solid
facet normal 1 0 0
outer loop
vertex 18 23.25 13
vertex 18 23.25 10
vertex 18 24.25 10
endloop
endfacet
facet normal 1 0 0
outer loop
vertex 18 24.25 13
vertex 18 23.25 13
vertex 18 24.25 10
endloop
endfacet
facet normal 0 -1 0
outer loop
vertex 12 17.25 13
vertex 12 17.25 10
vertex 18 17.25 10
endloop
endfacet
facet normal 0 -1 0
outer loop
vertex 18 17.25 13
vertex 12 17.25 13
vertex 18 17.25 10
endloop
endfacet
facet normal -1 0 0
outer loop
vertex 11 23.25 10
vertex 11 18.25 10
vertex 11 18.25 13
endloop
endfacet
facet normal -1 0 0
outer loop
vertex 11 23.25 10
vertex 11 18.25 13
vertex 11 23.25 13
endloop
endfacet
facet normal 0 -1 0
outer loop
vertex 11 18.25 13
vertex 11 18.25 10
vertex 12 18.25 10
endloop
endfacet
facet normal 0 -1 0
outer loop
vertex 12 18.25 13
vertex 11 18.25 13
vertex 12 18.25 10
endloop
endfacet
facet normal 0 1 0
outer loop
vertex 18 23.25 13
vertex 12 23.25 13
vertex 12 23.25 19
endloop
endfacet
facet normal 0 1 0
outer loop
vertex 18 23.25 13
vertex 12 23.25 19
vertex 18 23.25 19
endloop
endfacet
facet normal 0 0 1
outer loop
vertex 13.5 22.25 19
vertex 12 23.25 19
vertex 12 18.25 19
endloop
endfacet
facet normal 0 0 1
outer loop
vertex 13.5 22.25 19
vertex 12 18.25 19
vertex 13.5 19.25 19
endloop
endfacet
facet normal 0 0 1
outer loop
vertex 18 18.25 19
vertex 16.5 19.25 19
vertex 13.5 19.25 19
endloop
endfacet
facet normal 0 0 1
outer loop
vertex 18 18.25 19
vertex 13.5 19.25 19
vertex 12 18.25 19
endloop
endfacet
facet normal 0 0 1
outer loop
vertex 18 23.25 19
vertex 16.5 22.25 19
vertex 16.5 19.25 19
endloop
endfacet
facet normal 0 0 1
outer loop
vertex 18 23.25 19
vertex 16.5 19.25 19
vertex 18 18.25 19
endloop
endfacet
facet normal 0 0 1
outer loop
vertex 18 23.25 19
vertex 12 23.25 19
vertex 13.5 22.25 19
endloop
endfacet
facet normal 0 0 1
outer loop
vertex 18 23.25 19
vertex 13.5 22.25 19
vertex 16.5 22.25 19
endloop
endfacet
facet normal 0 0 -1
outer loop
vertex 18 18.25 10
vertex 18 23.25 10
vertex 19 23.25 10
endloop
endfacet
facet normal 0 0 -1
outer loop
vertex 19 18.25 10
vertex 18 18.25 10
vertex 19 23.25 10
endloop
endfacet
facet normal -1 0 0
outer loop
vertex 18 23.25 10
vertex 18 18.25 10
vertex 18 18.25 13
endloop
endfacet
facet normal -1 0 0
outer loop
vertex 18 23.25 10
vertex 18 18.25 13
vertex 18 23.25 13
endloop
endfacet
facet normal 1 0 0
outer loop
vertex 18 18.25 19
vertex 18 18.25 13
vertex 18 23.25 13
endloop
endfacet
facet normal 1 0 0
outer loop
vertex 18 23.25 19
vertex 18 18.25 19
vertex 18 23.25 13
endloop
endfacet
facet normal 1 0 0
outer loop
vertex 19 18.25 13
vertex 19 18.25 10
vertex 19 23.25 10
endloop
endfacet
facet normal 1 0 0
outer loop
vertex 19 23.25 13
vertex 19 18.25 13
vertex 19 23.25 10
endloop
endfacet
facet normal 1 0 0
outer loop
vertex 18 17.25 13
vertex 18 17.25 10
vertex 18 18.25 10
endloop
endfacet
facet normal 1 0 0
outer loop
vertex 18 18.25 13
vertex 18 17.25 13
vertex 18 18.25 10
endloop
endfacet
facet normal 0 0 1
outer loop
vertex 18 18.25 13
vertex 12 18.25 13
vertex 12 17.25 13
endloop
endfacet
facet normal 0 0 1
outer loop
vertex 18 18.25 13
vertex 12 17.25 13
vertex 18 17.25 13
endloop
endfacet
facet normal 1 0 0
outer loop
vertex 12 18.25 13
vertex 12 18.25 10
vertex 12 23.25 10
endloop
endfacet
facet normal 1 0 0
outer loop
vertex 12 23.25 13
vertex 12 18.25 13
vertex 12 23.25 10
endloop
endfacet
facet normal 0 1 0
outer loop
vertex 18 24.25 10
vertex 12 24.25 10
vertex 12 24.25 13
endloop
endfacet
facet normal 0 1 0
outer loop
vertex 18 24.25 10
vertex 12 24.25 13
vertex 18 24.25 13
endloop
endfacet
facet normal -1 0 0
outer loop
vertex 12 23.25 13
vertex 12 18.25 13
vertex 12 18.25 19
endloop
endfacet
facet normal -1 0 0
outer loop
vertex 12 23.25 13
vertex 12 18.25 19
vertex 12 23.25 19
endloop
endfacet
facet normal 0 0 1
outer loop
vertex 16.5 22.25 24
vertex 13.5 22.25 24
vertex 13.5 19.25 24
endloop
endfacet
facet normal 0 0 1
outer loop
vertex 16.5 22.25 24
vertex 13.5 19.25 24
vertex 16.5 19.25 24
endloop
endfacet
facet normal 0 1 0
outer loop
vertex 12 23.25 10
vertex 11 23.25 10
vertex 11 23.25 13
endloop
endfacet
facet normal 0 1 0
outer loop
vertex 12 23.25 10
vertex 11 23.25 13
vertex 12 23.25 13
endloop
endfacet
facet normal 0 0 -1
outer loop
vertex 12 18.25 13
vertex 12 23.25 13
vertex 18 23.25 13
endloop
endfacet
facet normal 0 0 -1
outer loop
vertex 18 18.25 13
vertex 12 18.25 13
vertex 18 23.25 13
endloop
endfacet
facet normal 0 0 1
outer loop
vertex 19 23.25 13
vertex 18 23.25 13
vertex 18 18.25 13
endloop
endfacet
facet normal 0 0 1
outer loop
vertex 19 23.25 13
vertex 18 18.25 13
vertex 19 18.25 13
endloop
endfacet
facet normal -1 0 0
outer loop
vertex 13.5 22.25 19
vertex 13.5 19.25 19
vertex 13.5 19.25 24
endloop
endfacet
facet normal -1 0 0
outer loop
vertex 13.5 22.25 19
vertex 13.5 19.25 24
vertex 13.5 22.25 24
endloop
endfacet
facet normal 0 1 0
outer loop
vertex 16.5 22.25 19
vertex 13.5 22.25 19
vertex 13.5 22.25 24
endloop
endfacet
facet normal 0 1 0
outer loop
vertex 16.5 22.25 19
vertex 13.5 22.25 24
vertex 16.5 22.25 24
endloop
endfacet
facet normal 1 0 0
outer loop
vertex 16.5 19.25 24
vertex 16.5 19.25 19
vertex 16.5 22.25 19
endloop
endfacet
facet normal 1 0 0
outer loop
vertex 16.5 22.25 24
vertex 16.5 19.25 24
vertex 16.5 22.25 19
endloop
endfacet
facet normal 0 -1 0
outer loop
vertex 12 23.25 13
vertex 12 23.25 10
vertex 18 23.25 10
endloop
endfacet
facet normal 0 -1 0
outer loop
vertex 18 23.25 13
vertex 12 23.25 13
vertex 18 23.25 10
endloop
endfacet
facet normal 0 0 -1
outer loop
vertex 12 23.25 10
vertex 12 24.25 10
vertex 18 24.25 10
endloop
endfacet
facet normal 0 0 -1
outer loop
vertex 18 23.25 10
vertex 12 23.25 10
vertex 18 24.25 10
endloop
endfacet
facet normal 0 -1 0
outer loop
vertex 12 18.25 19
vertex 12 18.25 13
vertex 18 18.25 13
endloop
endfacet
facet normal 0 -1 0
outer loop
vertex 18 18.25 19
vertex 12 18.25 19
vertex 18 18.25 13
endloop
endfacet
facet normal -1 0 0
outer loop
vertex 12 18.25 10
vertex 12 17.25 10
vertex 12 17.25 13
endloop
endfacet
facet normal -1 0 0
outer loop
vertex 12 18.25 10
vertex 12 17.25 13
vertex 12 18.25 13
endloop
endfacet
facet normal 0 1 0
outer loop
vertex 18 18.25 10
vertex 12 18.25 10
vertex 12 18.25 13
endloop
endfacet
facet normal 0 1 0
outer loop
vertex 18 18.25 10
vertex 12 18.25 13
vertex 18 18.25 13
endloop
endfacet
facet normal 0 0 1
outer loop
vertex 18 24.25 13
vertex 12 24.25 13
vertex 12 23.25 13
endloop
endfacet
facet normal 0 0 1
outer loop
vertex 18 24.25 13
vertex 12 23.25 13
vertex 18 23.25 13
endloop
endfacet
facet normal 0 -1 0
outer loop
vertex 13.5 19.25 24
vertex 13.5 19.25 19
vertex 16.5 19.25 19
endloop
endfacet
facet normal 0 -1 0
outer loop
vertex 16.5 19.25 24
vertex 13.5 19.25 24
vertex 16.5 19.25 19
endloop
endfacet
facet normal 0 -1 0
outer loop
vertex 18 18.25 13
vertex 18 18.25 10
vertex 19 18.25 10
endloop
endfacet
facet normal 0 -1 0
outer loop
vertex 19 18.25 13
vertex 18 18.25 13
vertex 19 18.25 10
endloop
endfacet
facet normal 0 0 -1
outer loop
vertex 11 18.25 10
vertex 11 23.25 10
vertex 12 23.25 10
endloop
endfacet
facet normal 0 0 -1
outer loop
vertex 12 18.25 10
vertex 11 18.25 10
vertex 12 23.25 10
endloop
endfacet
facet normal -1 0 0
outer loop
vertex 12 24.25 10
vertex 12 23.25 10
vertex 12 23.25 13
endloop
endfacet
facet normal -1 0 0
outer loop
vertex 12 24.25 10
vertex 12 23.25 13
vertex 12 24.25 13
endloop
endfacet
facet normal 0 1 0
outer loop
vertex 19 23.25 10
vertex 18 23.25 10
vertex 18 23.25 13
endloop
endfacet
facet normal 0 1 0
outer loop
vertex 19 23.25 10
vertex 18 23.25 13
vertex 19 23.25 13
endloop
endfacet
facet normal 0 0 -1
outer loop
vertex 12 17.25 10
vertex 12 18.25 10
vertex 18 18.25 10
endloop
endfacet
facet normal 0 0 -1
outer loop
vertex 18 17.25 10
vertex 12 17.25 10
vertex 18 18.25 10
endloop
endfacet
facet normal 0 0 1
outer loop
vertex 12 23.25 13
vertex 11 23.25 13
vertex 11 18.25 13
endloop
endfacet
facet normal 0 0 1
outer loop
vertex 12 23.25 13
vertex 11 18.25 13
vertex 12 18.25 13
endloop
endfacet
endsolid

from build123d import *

# Parameters (mm, degrees)
BOX036_W     = 3
BOX036_H     = 3
BOX036_DEPTH = 10
BOX038_W     = 1
BOX038_H     = 5
BOX038_DEPTH = 3
BOX039_W     = 1
BOX039_H     = 5
BOX039_DEPTH = 3
BOX040_W     = 6
BOX040_H     = 1
BOX040_DEPTH = 3
BOX041_W     = 6
BOX041_H     = 1
BOX041_DEPTH = 3
BOX037_W     = 6
BOX037_H     = 5
BOX037_DEPTH = 6


with BuildPart() as box036:
    # Box036 → Box036 (new body)
    with BuildSketch(Plane(origin=(13.5, 8.25, 10), x_dir=(1, 0, 0), z_dir=(0, 0, 1))):
        with Locations((1.5, 1.5)):
            Rectangle(BOX036_W, BOX036_H)
    extrude(amount=BOX036_DEPTH)


with BuildPart() as box038:
    # Box038 → Box038 (new body)
    with BuildSketch(Plane(origin=(11, 7.25, 6), x_dir=(1, 0, 0), z_dir=(0, 0, 1))):
        with Locations((0.5, 2.5)):
            Rectangle(BOX038_W, BOX038_H)
    extrude(amount=BOX038_DEPTH)


with BuildPart() as box039:
    # Box039 → Box039 (new body)
    with BuildSketch(Plane(origin=(18, 7.25, 6), x_dir=(1, 0, 0), z_dir=(0, 0, 1))):
        with Locations((0.5, 2.5)):
            Rectangle(BOX039_W, BOX039_H)
    extrude(amount=BOX039_DEPTH)


with BuildPart() as box040:
    # Box040 → Box040 (new body)
    with BuildSketch(Plane(origin=(12, 6.25, 6), x_dir=(1, 0, 0), z_dir=(0, 0, 1))):
        with Locations((3, 0.5)):
            Rectangle(BOX040_W, BOX040_H)
    extrude(amount=BOX040_DEPTH)


with BuildPart() as box041:
    # Box041 → Box041 (new body)
    with BuildSketch(Plane(origin=(12, 12.25, 6), x_dir=(1, 0, 0), z_dir=(0, 0, 1))):
        with Locations((3, 0.5)):
            Rectangle(BOX041_W, BOX041_H)
    extrude(amount=BOX041_DEPTH)


with BuildPart() as bt_ex2:
    # Box037 → Box037 (new body)
    with BuildSketch(Plane(origin=(12, 7.25, 9), x_dir=(1, 0, 0), z_dir=(0, 0, 1))):
        with Locations((3, 2.5)):
            Rectangle(BOX037_W, BOX037_H)
    extrude(amount=BOX037_DEPTH)

    # Fusion010: union Box038, Box039, Box040, Box041
    add(box038.part)
    add(box039.part)
    add(box040.part)
    add(box041.part)

    # Fusion011: union Box036
    add(box036.part)


with BuildPart() as bt_ex2_1:
    # Fusion011 placement: moved
    add(bt_ex2.part.moved(Location((0, 11, 4))))


solid = bt_ex2_1.part
